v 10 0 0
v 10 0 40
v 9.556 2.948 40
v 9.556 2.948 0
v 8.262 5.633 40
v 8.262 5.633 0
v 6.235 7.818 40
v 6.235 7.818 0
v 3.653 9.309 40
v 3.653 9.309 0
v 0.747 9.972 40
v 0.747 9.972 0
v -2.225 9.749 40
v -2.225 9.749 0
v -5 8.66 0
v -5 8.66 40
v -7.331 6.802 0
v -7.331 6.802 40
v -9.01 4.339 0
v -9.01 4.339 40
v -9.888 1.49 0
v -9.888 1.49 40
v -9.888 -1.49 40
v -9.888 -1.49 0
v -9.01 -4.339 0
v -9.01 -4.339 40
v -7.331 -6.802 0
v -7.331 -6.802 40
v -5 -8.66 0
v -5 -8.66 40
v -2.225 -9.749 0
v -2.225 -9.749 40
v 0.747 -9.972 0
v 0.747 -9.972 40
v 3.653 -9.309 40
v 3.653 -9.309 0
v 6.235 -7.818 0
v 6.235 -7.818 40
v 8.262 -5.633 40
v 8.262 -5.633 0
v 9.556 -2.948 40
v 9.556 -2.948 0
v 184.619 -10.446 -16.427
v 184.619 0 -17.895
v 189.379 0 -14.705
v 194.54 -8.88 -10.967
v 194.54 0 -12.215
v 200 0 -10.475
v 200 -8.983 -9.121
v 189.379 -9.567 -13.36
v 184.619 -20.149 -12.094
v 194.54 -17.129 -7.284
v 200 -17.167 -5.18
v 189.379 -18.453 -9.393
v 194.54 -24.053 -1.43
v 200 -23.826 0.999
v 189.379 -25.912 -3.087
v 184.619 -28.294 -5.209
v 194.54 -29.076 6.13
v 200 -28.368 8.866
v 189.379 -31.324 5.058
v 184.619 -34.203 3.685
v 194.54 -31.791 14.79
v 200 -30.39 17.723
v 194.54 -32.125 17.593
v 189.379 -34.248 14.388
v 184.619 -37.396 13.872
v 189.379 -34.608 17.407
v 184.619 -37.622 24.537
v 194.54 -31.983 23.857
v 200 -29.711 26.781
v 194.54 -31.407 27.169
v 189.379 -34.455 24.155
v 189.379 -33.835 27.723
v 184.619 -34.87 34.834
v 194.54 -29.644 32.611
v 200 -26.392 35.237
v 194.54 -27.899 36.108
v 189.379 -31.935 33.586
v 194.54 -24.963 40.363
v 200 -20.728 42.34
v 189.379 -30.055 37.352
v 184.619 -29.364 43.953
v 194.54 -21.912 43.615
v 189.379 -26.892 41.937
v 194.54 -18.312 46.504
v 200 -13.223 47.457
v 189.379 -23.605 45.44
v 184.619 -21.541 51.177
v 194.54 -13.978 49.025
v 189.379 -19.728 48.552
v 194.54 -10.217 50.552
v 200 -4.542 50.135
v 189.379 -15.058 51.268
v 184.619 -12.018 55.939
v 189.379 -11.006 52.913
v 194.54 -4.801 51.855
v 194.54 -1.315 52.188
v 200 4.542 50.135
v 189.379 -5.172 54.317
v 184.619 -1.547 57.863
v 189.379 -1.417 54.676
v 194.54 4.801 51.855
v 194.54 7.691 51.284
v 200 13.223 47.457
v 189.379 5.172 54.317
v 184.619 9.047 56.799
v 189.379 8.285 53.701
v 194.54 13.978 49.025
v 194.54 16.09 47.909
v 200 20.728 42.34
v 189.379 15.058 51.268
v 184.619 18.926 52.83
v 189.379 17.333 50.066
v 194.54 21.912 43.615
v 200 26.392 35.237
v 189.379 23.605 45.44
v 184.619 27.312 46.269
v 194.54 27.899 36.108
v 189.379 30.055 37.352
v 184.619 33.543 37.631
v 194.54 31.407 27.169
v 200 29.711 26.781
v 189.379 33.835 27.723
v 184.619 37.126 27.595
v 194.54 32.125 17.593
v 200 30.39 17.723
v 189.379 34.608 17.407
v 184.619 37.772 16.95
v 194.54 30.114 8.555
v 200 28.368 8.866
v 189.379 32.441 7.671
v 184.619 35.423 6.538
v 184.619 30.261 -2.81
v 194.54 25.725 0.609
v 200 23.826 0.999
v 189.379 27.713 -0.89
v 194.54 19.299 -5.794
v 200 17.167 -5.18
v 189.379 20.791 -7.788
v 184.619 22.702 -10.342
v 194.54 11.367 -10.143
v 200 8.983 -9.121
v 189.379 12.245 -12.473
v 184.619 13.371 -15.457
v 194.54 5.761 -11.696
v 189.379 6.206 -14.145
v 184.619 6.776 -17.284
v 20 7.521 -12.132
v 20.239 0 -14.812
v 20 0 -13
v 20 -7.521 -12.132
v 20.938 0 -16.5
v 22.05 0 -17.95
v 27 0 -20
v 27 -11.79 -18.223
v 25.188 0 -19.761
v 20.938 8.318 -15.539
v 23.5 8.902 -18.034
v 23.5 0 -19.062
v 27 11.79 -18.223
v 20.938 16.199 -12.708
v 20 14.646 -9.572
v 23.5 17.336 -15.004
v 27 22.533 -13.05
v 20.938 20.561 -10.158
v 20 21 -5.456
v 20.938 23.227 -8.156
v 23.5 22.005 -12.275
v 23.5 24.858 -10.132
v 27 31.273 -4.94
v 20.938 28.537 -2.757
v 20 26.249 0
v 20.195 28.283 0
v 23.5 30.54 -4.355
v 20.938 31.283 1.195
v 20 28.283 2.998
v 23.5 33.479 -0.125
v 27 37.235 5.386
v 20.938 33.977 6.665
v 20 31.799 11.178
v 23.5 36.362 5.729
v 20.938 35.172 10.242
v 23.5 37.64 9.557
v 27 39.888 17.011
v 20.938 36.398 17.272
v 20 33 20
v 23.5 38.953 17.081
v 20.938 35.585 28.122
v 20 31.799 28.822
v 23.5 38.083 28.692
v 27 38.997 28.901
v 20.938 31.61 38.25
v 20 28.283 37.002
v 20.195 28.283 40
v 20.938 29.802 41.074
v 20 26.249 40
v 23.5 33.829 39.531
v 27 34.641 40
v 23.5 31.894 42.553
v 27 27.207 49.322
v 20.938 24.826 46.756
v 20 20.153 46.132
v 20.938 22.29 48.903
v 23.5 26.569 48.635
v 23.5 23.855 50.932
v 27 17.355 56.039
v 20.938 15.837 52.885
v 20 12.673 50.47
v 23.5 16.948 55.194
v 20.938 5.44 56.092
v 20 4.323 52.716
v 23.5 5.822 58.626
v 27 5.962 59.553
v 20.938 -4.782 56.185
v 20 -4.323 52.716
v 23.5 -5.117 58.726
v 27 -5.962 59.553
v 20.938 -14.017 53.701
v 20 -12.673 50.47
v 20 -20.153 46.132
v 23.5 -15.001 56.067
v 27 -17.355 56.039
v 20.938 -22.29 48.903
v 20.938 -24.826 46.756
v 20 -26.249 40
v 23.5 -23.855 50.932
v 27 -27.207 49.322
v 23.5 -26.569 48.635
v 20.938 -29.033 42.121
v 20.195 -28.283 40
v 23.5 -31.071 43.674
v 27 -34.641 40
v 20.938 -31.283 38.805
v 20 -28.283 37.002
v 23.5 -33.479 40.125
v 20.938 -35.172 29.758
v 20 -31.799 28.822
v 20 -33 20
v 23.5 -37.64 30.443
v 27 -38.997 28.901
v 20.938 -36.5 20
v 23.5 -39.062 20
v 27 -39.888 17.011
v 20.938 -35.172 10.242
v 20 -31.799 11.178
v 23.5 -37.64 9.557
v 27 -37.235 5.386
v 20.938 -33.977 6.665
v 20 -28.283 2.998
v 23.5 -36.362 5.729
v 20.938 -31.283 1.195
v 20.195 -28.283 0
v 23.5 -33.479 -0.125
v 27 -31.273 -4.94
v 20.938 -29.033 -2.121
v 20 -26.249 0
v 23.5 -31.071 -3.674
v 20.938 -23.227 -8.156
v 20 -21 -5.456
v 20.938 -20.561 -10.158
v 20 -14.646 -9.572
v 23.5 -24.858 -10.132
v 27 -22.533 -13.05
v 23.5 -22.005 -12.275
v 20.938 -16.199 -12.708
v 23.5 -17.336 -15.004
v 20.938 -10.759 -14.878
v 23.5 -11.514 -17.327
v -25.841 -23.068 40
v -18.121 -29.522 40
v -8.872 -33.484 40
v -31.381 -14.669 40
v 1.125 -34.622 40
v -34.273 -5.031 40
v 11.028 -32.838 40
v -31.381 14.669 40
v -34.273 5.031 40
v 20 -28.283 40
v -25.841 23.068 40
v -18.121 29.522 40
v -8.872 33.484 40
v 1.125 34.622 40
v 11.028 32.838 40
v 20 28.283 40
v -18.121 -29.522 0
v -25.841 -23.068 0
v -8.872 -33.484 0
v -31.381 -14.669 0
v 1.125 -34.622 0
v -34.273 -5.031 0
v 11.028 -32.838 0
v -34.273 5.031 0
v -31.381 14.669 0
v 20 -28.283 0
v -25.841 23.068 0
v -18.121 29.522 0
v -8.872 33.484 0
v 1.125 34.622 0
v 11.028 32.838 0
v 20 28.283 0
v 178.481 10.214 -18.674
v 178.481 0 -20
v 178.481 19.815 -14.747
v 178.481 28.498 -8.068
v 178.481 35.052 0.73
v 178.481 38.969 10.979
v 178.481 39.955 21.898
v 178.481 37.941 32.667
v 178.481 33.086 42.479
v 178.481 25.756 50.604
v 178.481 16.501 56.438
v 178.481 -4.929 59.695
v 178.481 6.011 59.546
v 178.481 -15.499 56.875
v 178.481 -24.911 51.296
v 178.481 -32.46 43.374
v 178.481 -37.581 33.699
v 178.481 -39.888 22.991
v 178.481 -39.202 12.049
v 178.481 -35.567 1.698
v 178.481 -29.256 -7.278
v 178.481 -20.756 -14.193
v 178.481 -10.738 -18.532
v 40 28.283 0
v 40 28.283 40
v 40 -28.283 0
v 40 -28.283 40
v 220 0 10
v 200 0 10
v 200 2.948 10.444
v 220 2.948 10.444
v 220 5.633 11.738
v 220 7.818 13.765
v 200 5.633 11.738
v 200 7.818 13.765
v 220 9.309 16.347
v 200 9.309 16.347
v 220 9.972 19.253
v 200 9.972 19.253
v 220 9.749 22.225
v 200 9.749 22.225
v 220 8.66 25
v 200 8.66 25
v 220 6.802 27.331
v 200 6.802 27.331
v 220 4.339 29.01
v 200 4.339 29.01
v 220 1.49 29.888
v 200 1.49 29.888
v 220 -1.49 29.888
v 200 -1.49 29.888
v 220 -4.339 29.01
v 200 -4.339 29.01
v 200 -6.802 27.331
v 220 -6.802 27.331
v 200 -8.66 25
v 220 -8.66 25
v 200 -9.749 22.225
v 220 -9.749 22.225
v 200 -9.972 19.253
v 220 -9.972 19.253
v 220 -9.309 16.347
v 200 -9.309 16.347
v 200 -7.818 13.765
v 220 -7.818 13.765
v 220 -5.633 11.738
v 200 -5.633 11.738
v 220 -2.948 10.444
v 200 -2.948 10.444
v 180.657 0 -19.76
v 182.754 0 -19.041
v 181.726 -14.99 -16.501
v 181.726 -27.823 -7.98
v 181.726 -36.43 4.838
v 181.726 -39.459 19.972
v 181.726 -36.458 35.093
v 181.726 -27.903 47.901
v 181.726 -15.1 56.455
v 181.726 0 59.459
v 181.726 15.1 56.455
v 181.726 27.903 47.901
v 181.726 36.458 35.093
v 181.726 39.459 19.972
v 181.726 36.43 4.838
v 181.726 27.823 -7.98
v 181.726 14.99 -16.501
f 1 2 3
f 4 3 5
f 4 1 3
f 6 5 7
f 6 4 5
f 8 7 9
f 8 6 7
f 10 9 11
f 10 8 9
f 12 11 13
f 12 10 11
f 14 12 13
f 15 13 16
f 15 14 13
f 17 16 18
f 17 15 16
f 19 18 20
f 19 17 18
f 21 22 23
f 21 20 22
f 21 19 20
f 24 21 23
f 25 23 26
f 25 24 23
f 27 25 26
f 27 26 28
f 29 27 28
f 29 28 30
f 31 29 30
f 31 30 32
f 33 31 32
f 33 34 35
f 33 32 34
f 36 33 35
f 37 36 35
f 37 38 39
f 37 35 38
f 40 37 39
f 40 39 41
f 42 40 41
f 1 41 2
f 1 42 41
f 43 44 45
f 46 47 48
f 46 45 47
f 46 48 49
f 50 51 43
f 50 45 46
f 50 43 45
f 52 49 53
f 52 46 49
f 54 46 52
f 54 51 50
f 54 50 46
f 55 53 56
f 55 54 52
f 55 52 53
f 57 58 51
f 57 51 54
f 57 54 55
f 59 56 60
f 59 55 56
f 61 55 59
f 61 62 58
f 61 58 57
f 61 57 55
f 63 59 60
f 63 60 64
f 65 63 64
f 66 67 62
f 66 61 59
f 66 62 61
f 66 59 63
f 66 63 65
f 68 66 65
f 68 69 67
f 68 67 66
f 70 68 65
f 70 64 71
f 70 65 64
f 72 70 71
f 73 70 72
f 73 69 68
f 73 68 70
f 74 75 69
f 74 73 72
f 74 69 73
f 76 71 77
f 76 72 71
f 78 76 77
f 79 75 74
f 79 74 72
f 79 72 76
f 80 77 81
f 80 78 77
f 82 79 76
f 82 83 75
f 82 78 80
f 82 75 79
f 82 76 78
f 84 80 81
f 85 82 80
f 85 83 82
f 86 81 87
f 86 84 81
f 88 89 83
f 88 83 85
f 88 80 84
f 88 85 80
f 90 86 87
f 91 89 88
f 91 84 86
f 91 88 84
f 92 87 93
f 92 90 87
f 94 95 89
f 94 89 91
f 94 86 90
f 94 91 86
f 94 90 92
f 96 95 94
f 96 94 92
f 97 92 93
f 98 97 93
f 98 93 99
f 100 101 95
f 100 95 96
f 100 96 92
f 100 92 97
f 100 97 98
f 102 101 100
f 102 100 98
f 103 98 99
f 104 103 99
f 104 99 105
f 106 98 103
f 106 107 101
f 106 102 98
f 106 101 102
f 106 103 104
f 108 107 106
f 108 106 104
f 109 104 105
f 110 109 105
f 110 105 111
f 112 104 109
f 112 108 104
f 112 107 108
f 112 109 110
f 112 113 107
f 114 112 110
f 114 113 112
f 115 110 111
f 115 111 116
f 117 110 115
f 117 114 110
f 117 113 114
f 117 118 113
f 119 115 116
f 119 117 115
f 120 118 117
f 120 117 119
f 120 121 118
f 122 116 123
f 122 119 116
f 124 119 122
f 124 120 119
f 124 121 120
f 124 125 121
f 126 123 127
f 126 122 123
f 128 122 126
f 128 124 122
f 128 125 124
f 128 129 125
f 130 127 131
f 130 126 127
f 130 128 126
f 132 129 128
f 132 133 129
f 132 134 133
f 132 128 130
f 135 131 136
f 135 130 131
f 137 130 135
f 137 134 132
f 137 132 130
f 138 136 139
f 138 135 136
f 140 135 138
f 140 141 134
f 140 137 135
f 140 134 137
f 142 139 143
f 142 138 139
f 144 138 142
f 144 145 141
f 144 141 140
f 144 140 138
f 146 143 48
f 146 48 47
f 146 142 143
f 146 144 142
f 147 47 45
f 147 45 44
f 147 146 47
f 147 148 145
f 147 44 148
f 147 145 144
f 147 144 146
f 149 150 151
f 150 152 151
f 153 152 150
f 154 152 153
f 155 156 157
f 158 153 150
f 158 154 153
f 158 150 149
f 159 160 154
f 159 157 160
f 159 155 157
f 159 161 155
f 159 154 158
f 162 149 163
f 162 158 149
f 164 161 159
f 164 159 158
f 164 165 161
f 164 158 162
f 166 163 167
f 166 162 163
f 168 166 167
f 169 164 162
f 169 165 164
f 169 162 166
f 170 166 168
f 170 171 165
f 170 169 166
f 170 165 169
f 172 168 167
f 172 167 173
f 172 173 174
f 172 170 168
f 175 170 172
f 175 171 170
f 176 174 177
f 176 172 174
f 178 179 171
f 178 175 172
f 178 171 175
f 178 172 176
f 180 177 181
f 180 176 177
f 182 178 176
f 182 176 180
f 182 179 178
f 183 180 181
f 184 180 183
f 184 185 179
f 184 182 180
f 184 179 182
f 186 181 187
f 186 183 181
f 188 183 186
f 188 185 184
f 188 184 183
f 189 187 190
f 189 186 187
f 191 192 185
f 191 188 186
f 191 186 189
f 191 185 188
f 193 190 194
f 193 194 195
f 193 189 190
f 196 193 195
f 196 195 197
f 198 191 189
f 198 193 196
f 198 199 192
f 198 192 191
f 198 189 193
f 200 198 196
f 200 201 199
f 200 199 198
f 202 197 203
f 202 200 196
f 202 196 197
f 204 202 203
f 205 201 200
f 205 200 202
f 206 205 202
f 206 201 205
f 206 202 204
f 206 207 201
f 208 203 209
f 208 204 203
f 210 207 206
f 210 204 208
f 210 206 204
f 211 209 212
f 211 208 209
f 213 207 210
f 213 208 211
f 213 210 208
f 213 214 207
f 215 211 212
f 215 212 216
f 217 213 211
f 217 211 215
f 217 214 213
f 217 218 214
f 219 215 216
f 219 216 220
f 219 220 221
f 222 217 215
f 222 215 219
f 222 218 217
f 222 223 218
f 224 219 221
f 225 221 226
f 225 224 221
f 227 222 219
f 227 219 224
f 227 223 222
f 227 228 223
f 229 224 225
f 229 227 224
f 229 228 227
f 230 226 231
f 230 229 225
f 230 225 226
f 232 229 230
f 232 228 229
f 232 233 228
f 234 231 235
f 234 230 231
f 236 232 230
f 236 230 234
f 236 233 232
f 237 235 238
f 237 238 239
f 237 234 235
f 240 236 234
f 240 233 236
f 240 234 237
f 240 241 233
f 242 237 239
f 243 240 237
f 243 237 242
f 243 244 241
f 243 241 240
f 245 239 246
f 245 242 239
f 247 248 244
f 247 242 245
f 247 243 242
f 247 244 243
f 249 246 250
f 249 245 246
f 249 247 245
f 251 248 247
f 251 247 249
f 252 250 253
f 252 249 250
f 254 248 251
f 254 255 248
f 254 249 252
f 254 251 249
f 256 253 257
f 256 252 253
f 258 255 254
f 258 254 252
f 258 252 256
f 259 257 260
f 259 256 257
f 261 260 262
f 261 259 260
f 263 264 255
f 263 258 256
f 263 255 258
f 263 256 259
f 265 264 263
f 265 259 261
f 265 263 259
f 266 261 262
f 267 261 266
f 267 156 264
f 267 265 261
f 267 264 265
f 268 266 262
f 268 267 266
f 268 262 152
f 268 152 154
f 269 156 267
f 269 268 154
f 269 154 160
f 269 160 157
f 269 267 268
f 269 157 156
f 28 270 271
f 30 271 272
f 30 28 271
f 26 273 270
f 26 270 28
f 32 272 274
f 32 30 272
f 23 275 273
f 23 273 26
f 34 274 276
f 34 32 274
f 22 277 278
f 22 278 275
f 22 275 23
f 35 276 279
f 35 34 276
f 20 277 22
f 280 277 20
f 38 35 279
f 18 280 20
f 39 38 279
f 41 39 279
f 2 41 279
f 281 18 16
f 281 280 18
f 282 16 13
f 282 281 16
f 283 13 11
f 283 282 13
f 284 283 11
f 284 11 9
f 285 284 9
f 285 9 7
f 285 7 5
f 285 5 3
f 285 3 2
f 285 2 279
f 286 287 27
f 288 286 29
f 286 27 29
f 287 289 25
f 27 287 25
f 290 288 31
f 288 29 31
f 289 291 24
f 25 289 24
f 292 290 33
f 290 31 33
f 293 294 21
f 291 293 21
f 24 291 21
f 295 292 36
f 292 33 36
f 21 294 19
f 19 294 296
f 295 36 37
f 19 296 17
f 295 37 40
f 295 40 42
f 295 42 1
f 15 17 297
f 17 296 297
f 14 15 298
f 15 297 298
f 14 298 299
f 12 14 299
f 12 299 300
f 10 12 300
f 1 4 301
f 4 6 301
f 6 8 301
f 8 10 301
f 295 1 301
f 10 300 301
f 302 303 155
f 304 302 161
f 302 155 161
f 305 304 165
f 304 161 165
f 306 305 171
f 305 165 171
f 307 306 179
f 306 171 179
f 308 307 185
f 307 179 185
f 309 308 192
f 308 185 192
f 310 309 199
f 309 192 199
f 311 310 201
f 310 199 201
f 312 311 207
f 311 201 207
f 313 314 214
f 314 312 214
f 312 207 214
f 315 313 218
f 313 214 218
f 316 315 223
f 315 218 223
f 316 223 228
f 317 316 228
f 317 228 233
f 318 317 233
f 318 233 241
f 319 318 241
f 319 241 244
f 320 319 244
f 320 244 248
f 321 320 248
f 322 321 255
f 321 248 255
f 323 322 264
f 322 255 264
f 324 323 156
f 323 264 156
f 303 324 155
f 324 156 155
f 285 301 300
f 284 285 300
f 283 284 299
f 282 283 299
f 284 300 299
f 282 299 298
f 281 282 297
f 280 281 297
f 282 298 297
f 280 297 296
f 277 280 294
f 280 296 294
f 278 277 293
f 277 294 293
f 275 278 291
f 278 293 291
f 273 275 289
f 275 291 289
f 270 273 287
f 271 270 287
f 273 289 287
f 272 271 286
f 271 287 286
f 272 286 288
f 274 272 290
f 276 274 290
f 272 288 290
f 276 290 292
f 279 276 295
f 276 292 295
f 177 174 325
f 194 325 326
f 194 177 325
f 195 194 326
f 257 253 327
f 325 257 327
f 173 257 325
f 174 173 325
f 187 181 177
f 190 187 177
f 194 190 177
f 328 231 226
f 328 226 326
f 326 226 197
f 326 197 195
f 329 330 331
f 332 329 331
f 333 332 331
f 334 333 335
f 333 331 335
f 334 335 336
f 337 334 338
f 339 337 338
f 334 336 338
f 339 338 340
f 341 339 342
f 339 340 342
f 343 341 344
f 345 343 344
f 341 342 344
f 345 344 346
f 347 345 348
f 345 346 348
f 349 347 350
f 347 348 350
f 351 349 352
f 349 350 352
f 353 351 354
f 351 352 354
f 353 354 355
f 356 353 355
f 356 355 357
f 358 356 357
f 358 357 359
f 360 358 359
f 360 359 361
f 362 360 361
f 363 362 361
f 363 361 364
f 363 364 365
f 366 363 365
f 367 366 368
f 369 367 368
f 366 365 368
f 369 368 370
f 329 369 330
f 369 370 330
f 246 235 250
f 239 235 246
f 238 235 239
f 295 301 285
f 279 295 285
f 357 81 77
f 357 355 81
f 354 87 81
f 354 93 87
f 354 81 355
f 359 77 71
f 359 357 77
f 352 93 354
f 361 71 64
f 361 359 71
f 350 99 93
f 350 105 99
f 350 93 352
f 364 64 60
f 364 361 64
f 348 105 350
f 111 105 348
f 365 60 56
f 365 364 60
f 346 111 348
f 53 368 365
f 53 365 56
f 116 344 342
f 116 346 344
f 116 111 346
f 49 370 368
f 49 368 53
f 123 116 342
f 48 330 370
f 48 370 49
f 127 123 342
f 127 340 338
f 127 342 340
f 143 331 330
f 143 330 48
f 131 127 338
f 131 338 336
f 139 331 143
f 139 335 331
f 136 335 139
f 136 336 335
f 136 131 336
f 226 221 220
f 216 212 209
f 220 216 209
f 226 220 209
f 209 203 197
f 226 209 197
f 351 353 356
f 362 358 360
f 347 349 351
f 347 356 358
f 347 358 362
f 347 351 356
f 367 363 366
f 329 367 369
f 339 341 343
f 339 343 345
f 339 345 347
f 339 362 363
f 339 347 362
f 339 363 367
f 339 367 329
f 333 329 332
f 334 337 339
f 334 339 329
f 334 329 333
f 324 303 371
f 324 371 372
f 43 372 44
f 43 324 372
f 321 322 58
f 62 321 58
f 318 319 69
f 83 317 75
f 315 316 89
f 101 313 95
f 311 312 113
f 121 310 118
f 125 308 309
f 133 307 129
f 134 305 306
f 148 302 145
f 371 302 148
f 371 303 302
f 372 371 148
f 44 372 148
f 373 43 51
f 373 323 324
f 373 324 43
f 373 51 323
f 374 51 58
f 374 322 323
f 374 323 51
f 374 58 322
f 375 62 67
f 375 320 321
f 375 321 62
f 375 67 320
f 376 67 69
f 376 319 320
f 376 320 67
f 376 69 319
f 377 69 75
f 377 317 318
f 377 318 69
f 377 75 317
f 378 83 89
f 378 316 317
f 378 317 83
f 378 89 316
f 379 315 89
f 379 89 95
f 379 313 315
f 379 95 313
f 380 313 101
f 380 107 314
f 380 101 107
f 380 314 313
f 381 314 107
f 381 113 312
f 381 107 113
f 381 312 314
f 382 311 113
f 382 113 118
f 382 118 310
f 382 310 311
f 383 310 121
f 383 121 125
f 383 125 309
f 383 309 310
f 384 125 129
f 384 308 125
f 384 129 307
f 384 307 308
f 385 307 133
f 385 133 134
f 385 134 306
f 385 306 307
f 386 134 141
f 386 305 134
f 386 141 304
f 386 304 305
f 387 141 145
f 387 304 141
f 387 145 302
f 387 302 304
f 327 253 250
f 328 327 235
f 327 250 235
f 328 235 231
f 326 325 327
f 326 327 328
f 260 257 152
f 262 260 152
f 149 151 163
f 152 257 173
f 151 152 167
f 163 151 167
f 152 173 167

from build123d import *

# Parameters (mm, degrees)
SKETCH1_R                = 34.64
BOSS_EXTRUDE1_DEPTH      = 40
SKETCH2_R                = 10
CUT_EXTRUDE2_DEPTH       = 64.244440072
BOSS_EXTRUDE2_DEPTH      = 160
BOSS_EXTRUDE2_DEPTH_BACK = 20
SKETCH4_R                = 40
SKETCH5_W                = 40
SKETCH5_H                = 56.566053424
CUT_EXTRUDE3_DEPTH       = 20
FILLET1_R                = 10
FILLET2_R                = 7
SKETCH7_R                = 10
BOSS_EXTRUDE5_DEPTH      = 20


with BuildPart() as part:
    # Sketch1 → Boss-Extrude1 (new body)
    with BuildSketch(Plane.XY):
        Circle(SKETCH1_R)
    extrude(amount=BOSS_EXTRUDE1_DEPTH)

    # Sketch2 → Cut-Extrude2 (cut, through all)
    with BuildSketch(Plane.XY):
        Circle(SKETCH2_R)
    extrude(amount=CUT_EXTRUDE2_DEPTH, mode=Mode.SUBTRACT)

    # Sketch4 → Boss-Extrude2 (add, two sides: drawn at the far end of the back side and taken through both)
    with BuildSketch(Plane(origin=(40, 0, 0), x_dir=(0, 0, -1), z_dir=(1, 0, 0)).offset(-BOSS_EXTRUDE2_DEPTH_BACK)):
        with Locations((-20, 0)):
            Circle(SKETCH4_R)
    extrude(amount=BOSS_EXTRUDE2_DEPTH + BOSS_EXTRUDE2_DEPTH_BACK)

    # Sketch5 → Cut-Extrude3 (cut)
    with BuildSketch(Plane.ZY.offset(-20)):
        with Locations((20, 0)):
            Rectangle(SKETCH5_W, SKETCH5_H)
    extrude(amount=-CUT_EXTRUDE3_DEPTH, mode=Mode.SUBTRACT)


with BuildPart() as cut_extrude3_piece_1:
    # of the separate pieces the step leaves, piece 1, a body of its own (cut_extrude3_pieces)
    add(part.part.solids().sort_by_distance((20, 0, -20))[0])

    # Sketch6 → Cut-Revolve1 (revolve, cut)
    with BuildSketch(Plane(origin=(0, 0, 0), x_dir=(1, 0, 0), z_dir=(0, 1, 0))):
        with BuildLine():
            Line((182.124448295, 20), (200, 20))
            Line((200, 20), (200, 10.474881664))
            ThreePointArc((200, 10.474881664), (190.460193711, 14.107625347), (182.124448295, 20))
        make_face()
    revolve(axis=Axis((200, 0, 20), (-1, 0, 0)), mode=Mode.SUBTRACT)

    # Fillet1
    fillet1_edges = [cut_extrude3_piece_1.edges().sort_by_distance(p)[0] for p in [
        (182.124448295, 0, 60),
    ]]
    fillet(fillet1_edges, radius=FILLET1_R)

    # Fillet2
    # the kernel refuses this fillet: 7 mm, written as the material it takes off along each edge
    with BuildSketch(Plane(origin=(20, 0, 20), x_dir=(0, 0, -1), z_dir=(0, -1, 0))) as fillet2_piece_1:
        with BuildLine():
            CenterArc((40 - FILLET2_R, FILLET2_R), FILLET2_R, 270, 90)
            Line((40 - FILLET2_R, 0), (40, 0))
            Line((40, 0), (40, FILLET2_R))
        make_face()
    revolve(axis=Axis((20, 0, 20), (1, 0, 0)), mode=Mode.SUBTRACT)

    # Sketch7 → Boss-Extrude5 (add)
    with BuildSketch(Plane(origin=(200, 0, 0), x_dir=(0, 0, -1), z_dir=(1, 0, 0))):
        with Locations((-20, 0)):
            Circle(SKETCH7_R)
    extrude(amount=BOSS_EXTRUDE5_DEPTH)


with BuildPart() as cut_extrude3_piece_2:
    # of the separate pieces the step leaves, piece 2, a body of its own (cut_extrude3_pieces)
    add(part.part.solids().sort_by_distance((10, 0, 0))[0])


solid = Compound([cut_extrude3_piece_1.part, cut_extrude3_piece_2.part])
